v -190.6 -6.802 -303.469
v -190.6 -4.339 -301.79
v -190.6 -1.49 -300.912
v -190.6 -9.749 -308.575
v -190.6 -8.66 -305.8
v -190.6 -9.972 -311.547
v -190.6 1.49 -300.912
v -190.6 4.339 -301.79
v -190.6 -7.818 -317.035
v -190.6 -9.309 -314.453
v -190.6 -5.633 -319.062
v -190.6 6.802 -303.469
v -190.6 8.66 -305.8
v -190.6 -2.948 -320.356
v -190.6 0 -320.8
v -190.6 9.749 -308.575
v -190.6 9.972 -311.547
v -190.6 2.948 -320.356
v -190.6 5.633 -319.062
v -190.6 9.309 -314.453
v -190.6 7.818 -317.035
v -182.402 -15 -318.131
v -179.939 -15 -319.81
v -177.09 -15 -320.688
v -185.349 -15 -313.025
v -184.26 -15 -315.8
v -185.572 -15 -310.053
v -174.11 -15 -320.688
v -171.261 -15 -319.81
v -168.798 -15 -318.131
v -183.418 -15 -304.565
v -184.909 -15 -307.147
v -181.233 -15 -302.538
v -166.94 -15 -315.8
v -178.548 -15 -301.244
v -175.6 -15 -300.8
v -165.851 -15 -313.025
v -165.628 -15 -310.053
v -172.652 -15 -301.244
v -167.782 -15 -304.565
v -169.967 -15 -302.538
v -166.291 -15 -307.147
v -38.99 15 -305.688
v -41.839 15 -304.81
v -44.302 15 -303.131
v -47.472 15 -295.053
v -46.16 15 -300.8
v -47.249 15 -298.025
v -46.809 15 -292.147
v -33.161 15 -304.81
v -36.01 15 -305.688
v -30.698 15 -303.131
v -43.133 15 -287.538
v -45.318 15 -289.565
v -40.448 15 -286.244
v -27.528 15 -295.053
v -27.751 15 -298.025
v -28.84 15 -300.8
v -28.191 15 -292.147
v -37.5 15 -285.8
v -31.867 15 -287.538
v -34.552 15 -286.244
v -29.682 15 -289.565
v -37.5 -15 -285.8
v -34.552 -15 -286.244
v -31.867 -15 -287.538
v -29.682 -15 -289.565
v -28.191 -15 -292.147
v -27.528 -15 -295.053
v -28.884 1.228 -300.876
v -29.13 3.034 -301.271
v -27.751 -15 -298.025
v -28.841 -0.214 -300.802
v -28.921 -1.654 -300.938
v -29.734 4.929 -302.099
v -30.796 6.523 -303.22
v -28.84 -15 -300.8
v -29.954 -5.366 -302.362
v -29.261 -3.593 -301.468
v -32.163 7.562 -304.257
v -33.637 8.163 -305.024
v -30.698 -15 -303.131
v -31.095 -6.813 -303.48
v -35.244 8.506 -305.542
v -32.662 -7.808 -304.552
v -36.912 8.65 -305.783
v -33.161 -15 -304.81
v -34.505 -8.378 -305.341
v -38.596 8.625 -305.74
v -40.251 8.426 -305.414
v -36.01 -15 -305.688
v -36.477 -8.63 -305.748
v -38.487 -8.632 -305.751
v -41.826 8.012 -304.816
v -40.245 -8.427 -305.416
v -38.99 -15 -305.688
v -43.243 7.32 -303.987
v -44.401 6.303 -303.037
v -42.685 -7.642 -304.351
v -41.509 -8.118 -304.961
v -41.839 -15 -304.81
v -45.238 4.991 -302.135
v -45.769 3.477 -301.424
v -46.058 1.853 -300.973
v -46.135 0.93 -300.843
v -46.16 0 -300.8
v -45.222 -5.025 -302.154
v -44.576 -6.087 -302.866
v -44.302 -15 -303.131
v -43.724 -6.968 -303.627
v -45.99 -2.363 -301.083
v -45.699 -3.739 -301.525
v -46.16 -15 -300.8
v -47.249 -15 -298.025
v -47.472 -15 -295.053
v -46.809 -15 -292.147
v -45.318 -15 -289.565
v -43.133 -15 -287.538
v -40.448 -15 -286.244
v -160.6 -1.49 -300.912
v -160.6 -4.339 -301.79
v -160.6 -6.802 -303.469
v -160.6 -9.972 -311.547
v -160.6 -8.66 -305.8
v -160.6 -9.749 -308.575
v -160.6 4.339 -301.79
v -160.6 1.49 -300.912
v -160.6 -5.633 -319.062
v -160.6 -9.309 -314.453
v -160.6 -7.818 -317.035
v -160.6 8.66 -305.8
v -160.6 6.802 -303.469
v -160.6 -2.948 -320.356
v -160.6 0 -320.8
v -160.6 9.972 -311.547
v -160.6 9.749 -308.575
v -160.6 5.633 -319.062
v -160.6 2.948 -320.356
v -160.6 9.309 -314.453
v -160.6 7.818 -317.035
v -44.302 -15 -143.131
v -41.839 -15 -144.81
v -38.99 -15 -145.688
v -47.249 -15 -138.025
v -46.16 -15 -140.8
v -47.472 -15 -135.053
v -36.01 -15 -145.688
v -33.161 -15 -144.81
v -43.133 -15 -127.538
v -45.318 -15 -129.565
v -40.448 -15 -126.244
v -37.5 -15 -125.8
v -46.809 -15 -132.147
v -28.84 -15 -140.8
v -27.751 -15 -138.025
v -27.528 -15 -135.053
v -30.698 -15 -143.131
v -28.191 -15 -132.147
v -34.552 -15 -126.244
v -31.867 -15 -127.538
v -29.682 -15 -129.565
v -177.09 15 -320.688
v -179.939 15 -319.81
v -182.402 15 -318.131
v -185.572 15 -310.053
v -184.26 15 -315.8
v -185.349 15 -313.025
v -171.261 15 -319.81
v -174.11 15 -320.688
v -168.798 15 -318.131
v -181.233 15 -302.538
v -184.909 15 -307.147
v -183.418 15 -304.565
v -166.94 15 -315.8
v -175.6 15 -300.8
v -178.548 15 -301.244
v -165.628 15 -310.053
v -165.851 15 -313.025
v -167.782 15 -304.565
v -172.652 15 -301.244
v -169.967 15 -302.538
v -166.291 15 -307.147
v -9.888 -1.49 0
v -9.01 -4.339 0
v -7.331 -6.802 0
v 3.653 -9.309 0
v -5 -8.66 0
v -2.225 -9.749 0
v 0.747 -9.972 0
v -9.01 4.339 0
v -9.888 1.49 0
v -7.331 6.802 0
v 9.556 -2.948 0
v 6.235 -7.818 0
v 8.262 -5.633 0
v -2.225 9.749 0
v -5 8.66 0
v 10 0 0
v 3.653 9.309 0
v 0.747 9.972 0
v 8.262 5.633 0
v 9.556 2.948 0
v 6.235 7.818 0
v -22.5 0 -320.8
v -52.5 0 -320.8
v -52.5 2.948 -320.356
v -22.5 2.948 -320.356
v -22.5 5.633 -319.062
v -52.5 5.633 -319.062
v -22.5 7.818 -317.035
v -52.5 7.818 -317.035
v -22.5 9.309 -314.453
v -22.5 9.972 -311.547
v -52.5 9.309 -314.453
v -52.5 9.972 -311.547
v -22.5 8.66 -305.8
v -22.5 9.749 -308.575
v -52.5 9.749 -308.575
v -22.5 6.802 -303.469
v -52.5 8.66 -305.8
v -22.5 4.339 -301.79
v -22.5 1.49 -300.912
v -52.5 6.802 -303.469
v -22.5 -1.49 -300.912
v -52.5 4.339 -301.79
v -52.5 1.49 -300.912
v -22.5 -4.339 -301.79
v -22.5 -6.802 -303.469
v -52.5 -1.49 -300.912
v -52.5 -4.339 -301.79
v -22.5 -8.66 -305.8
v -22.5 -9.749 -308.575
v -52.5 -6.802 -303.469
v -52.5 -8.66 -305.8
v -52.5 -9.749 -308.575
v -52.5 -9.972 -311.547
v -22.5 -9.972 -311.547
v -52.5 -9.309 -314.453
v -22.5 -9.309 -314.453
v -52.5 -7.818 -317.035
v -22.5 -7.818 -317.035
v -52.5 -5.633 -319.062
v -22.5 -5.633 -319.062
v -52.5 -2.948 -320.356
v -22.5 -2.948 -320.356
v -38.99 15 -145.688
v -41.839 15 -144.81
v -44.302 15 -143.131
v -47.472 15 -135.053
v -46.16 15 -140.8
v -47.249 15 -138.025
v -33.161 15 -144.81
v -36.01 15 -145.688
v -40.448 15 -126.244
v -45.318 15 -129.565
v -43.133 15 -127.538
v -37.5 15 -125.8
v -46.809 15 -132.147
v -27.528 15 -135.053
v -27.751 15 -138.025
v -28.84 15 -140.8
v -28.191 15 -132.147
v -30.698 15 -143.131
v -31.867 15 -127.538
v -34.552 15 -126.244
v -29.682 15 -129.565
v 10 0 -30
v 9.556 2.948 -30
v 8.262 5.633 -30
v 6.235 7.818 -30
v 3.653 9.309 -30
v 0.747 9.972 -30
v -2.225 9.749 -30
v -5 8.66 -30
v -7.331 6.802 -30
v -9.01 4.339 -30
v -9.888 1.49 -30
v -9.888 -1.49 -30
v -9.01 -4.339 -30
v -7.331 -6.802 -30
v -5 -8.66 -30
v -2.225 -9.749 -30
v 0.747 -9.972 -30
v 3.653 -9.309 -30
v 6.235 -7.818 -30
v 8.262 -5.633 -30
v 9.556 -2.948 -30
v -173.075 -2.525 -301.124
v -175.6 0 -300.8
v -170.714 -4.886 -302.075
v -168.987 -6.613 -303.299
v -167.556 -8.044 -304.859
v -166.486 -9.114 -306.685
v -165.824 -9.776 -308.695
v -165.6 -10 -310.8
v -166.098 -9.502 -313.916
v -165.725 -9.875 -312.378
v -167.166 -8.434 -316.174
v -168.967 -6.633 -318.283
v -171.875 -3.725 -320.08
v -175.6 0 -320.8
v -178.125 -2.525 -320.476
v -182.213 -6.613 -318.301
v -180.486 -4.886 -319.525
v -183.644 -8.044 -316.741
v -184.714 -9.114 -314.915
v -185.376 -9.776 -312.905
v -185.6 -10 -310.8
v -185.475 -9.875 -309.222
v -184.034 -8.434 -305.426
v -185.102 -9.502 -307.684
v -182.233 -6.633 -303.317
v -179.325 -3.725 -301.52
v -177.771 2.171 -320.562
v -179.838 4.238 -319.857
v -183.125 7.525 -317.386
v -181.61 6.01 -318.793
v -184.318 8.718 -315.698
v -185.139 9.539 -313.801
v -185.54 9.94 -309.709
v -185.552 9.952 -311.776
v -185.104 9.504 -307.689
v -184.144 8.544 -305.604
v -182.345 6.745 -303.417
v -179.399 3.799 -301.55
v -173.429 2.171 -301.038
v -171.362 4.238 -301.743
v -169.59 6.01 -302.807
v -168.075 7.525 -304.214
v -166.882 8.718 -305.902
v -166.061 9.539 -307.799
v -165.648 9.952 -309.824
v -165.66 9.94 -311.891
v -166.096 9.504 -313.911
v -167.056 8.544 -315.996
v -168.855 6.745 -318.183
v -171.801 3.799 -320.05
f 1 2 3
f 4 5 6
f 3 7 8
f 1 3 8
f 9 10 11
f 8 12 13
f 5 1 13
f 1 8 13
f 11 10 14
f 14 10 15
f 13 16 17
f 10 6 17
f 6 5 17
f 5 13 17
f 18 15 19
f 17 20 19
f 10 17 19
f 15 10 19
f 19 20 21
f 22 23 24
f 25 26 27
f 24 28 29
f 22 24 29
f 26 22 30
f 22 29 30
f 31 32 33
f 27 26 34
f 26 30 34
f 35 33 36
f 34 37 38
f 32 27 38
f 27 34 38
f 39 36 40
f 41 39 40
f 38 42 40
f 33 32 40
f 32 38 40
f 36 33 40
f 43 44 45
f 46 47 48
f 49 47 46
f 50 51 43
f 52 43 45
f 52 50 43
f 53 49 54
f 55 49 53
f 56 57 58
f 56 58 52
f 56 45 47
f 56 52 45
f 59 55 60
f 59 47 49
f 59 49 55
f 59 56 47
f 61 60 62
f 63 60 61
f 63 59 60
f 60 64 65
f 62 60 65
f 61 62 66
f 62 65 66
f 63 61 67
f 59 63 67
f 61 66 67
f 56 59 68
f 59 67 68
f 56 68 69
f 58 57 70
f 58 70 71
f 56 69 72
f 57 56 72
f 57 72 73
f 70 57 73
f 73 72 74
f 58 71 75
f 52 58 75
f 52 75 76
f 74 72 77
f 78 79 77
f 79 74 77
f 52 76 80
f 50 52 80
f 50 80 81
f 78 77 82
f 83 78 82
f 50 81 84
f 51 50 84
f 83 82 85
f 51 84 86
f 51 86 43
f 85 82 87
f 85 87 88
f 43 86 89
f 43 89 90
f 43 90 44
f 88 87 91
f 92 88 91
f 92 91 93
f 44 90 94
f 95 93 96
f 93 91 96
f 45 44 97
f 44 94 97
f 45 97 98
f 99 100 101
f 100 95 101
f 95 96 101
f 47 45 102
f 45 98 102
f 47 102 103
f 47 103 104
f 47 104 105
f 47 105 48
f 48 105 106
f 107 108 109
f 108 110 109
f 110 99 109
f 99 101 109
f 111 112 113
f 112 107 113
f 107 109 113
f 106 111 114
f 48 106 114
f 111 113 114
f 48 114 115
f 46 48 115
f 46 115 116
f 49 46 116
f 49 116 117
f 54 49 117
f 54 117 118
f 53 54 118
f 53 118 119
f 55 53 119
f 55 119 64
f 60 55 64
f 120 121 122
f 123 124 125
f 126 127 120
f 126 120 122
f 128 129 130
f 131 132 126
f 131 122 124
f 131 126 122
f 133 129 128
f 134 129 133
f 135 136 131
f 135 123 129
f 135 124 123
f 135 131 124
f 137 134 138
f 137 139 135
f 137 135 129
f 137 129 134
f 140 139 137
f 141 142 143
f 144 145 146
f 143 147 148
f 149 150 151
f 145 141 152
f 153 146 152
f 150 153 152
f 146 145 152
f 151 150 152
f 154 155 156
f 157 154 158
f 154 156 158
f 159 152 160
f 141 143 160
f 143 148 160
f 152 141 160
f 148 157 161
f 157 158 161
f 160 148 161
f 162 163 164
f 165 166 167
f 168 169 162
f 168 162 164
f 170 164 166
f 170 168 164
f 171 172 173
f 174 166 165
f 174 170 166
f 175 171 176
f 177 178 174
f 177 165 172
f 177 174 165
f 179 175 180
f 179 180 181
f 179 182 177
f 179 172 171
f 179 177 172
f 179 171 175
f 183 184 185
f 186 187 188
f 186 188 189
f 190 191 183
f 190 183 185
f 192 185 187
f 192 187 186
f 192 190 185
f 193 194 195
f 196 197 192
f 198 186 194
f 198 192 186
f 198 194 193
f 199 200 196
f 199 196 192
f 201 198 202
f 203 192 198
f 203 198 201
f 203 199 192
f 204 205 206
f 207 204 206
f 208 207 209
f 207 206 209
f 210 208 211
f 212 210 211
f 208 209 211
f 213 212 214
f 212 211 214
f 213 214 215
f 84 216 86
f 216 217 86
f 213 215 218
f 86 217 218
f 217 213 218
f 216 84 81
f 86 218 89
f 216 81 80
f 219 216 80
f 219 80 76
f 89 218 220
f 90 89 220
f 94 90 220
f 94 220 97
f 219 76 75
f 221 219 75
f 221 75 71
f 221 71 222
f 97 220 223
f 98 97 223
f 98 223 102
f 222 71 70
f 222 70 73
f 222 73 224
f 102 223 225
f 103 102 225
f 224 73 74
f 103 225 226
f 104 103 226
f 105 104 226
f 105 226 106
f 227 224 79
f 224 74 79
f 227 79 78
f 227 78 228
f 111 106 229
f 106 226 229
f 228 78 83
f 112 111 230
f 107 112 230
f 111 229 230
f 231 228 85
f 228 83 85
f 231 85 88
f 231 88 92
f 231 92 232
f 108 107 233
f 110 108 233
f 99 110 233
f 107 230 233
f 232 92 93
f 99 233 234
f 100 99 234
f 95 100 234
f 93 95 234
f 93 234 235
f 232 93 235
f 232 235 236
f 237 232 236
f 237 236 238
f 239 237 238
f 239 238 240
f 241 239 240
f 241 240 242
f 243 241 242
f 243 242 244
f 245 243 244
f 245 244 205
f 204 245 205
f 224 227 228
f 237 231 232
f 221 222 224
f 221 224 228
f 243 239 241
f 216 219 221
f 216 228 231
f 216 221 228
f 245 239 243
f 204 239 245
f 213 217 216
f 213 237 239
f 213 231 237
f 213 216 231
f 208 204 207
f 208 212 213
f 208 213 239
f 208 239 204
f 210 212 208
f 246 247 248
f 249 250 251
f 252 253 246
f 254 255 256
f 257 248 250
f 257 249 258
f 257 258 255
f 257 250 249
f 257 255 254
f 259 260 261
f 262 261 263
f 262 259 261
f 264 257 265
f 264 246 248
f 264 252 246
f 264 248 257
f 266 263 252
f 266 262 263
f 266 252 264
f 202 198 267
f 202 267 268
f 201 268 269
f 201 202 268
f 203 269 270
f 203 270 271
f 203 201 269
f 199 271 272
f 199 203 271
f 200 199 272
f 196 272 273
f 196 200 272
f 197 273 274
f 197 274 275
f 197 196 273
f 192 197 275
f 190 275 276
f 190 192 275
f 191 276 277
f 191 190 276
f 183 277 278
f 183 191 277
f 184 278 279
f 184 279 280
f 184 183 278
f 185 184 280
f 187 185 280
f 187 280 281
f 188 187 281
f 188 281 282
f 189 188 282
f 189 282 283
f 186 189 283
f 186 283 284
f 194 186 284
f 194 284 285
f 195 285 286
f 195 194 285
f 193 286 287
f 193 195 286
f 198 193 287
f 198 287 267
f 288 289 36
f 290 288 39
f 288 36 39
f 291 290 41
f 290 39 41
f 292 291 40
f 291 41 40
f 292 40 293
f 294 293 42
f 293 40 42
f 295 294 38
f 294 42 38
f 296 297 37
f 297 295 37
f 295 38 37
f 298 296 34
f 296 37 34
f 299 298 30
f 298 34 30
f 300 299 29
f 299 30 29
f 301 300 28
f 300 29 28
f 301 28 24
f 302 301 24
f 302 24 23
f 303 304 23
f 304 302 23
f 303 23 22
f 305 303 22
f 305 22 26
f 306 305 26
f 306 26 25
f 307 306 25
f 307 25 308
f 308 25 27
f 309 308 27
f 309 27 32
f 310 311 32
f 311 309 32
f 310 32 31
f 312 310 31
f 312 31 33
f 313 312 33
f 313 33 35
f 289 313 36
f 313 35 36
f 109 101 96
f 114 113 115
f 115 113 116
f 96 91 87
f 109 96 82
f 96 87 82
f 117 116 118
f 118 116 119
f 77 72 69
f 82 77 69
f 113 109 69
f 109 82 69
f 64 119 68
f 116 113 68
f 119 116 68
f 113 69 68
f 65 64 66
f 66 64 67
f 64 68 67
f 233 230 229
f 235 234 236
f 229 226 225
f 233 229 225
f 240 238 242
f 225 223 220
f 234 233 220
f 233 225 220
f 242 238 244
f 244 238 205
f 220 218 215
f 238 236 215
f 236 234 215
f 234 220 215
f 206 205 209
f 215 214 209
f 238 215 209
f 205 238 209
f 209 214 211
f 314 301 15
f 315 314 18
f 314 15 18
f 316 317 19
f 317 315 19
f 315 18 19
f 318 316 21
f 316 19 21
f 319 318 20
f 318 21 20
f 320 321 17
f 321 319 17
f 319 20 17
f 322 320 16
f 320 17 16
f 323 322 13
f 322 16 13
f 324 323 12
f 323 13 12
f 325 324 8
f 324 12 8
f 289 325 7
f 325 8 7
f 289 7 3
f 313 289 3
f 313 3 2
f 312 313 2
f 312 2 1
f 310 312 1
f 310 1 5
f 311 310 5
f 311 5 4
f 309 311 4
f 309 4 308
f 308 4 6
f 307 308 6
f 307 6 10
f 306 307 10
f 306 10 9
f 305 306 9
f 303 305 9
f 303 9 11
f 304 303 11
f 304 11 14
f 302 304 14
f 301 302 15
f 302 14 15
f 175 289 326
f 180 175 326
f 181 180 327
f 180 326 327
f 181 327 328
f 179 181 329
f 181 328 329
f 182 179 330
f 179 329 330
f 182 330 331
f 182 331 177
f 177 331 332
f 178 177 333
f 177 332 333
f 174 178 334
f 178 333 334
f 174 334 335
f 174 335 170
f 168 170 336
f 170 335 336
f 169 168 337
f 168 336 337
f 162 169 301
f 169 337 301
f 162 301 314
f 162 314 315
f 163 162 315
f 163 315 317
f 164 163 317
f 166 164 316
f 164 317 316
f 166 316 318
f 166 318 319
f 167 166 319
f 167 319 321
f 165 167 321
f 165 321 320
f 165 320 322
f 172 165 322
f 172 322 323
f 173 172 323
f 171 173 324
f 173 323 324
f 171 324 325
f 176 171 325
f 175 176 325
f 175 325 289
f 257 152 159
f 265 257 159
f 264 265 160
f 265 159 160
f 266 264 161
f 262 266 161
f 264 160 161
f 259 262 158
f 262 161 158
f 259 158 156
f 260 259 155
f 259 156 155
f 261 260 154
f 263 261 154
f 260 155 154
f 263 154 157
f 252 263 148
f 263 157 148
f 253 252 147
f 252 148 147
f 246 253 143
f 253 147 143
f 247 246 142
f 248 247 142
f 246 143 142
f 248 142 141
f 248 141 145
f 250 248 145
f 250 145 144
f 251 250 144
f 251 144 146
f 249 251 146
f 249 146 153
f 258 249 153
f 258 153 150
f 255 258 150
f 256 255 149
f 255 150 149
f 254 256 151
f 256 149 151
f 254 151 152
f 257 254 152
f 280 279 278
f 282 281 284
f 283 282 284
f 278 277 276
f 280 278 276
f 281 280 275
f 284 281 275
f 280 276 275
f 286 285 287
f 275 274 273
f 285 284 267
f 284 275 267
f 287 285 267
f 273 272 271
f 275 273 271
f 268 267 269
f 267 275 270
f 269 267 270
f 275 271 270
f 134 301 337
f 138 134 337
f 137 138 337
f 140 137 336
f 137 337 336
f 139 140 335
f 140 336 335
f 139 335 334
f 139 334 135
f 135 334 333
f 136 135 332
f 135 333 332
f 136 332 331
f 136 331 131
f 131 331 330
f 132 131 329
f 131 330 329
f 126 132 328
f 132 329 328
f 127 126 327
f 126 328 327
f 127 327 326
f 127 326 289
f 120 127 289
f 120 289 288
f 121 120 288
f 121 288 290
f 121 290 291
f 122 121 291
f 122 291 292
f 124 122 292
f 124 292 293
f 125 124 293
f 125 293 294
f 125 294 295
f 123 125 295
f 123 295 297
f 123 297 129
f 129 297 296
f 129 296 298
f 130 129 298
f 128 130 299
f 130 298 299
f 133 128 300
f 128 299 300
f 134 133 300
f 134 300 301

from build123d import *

# Parameters (mm, degrees)
SKETCH2_R                  = 10
BOSS_EXTRUDE1_DEPTH        = 30
BOSS_EXTRUDE3_DEPTH        = 15
BOSS_EXTRUDE3_DEPTH_BACK   = 15
SKETCH4_R                  = 10
BOSS_EXTRUDE3_2_DEPTH      = 15
BOSS_EXTRUDE3_2_DEPTH_BACK = 15
BOSS_EXTRUDE3_3_DEPTH      = 15
BOSS_EXTRUDE3_3_DEPTH_BACK = 15
BOSS_EXTRUDE4_DEPTH        = 15
BOSS_EXTRUDE4_DEPTH_BACK   = 15
SKETCH5_R                  = 10
BOSS_EXTRUDE5_DEPTH        = 15
BOSS_EXTRUDE5_DEPTH_BACK   = 15
SKETCH6_R                  = 10


with BuildPart() as part:
    # Sketch2 → Boss-Extrude1 (new body)
    with BuildSketch(Plane.XY):
        Circle(SKETCH2_R)
    extrude(amount=-BOSS_EXTRUDE1_DEPTH)


with BuildPart() as body_2:
    # Sketch4 → Boss-Extrude3 (new, two sides: drawn at the far end of the back side and taken through both)
    with BuildSketch(Plane(origin=(0, 0, 0), x_dir=(1, 0, 0), z_dir=(0, 1, 0)).offset(-BOSS_EXTRUDE3_DEPTH_BACK)):
        with Locations((-37.5, 135.8)):
            Circle(SKETCH4_R)
    extrude(amount=BOSS_EXTRUDE3_DEPTH + BOSS_EXTRUDE3_DEPTH_BACK)


with BuildPart() as body_3:
    # Sketch4 → Boss-Extrude3 2 (new, two sides: drawn at the far end of the back side and taken through both)
    with BuildSketch(Plane(origin=(0, 0, 0), x_dir=(1, 0, 0), z_dir=(0, 1, 0)).offset(-BOSS_EXTRUDE3_2_DEPTH_BACK)):
        with Locations((-37.5, 295.8)):
            Circle(SKETCH4_R)
    extrude(amount=BOSS_EXTRUDE3_2_DEPTH + BOSS_EXTRUDE3_2_DEPTH_BACK)

    # Sketch5 → Boss-Extrude4 (add, two sides: drawn at the far end of the back side and taken through both)
    with BuildSketch(Plane(origin=(-37.5, 0, 0), x_dir=(0, 0, -1), z_dir=(1, 0, 0)).offset(-BOSS_EXTRUDE4_DEPTH_BACK)):
        with Locations((310.8, 0)):
            Circle(SKETCH5_R)
    extrude(amount=BOSS_EXTRUDE4_DEPTH + BOSS_EXTRUDE4_DEPTH_BACK)


with BuildPart() as body_4:
    # Sketch4 → Boss-Extrude3 3 (new, two sides: drawn at the far end of the back side and taken through both)
    with BuildSketch(Plane(origin=(0, 0, 0), x_dir=(1, 0, 0), z_dir=(0, 1, 0)).offset(-BOSS_EXTRUDE3_3_DEPTH_BACK)):
        with Locations((-175.6, 310.8)):
            Circle(SKETCH4_R)
    extrude(amount=BOSS_EXTRUDE3_3_DEPTH + BOSS_EXTRUDE3_3_DEPTH_BACK)

    # Sketch6 → Boss-Extrude5 (add, two sides: drawn at the far end of the back side and taken through both)
    with BuildSketch(Plane(origin=(-175.6, 0, 0), x_dir=(0, 0, -1), z_dir=(1, 0, 0)).offset(-BOSS_EXTRUDE5_DEPTH_BACK)):
        with Locations((310.8, 0)):
            Circle(SKETCH6_R)
    extrude(amount=BOSS_EXTRUDE5_DEPTH + BOSS_EXTRUDE5_DEPTH_BACK)


solid = Compound([part.part, body_2.part, body_3.part, body_4.part])
